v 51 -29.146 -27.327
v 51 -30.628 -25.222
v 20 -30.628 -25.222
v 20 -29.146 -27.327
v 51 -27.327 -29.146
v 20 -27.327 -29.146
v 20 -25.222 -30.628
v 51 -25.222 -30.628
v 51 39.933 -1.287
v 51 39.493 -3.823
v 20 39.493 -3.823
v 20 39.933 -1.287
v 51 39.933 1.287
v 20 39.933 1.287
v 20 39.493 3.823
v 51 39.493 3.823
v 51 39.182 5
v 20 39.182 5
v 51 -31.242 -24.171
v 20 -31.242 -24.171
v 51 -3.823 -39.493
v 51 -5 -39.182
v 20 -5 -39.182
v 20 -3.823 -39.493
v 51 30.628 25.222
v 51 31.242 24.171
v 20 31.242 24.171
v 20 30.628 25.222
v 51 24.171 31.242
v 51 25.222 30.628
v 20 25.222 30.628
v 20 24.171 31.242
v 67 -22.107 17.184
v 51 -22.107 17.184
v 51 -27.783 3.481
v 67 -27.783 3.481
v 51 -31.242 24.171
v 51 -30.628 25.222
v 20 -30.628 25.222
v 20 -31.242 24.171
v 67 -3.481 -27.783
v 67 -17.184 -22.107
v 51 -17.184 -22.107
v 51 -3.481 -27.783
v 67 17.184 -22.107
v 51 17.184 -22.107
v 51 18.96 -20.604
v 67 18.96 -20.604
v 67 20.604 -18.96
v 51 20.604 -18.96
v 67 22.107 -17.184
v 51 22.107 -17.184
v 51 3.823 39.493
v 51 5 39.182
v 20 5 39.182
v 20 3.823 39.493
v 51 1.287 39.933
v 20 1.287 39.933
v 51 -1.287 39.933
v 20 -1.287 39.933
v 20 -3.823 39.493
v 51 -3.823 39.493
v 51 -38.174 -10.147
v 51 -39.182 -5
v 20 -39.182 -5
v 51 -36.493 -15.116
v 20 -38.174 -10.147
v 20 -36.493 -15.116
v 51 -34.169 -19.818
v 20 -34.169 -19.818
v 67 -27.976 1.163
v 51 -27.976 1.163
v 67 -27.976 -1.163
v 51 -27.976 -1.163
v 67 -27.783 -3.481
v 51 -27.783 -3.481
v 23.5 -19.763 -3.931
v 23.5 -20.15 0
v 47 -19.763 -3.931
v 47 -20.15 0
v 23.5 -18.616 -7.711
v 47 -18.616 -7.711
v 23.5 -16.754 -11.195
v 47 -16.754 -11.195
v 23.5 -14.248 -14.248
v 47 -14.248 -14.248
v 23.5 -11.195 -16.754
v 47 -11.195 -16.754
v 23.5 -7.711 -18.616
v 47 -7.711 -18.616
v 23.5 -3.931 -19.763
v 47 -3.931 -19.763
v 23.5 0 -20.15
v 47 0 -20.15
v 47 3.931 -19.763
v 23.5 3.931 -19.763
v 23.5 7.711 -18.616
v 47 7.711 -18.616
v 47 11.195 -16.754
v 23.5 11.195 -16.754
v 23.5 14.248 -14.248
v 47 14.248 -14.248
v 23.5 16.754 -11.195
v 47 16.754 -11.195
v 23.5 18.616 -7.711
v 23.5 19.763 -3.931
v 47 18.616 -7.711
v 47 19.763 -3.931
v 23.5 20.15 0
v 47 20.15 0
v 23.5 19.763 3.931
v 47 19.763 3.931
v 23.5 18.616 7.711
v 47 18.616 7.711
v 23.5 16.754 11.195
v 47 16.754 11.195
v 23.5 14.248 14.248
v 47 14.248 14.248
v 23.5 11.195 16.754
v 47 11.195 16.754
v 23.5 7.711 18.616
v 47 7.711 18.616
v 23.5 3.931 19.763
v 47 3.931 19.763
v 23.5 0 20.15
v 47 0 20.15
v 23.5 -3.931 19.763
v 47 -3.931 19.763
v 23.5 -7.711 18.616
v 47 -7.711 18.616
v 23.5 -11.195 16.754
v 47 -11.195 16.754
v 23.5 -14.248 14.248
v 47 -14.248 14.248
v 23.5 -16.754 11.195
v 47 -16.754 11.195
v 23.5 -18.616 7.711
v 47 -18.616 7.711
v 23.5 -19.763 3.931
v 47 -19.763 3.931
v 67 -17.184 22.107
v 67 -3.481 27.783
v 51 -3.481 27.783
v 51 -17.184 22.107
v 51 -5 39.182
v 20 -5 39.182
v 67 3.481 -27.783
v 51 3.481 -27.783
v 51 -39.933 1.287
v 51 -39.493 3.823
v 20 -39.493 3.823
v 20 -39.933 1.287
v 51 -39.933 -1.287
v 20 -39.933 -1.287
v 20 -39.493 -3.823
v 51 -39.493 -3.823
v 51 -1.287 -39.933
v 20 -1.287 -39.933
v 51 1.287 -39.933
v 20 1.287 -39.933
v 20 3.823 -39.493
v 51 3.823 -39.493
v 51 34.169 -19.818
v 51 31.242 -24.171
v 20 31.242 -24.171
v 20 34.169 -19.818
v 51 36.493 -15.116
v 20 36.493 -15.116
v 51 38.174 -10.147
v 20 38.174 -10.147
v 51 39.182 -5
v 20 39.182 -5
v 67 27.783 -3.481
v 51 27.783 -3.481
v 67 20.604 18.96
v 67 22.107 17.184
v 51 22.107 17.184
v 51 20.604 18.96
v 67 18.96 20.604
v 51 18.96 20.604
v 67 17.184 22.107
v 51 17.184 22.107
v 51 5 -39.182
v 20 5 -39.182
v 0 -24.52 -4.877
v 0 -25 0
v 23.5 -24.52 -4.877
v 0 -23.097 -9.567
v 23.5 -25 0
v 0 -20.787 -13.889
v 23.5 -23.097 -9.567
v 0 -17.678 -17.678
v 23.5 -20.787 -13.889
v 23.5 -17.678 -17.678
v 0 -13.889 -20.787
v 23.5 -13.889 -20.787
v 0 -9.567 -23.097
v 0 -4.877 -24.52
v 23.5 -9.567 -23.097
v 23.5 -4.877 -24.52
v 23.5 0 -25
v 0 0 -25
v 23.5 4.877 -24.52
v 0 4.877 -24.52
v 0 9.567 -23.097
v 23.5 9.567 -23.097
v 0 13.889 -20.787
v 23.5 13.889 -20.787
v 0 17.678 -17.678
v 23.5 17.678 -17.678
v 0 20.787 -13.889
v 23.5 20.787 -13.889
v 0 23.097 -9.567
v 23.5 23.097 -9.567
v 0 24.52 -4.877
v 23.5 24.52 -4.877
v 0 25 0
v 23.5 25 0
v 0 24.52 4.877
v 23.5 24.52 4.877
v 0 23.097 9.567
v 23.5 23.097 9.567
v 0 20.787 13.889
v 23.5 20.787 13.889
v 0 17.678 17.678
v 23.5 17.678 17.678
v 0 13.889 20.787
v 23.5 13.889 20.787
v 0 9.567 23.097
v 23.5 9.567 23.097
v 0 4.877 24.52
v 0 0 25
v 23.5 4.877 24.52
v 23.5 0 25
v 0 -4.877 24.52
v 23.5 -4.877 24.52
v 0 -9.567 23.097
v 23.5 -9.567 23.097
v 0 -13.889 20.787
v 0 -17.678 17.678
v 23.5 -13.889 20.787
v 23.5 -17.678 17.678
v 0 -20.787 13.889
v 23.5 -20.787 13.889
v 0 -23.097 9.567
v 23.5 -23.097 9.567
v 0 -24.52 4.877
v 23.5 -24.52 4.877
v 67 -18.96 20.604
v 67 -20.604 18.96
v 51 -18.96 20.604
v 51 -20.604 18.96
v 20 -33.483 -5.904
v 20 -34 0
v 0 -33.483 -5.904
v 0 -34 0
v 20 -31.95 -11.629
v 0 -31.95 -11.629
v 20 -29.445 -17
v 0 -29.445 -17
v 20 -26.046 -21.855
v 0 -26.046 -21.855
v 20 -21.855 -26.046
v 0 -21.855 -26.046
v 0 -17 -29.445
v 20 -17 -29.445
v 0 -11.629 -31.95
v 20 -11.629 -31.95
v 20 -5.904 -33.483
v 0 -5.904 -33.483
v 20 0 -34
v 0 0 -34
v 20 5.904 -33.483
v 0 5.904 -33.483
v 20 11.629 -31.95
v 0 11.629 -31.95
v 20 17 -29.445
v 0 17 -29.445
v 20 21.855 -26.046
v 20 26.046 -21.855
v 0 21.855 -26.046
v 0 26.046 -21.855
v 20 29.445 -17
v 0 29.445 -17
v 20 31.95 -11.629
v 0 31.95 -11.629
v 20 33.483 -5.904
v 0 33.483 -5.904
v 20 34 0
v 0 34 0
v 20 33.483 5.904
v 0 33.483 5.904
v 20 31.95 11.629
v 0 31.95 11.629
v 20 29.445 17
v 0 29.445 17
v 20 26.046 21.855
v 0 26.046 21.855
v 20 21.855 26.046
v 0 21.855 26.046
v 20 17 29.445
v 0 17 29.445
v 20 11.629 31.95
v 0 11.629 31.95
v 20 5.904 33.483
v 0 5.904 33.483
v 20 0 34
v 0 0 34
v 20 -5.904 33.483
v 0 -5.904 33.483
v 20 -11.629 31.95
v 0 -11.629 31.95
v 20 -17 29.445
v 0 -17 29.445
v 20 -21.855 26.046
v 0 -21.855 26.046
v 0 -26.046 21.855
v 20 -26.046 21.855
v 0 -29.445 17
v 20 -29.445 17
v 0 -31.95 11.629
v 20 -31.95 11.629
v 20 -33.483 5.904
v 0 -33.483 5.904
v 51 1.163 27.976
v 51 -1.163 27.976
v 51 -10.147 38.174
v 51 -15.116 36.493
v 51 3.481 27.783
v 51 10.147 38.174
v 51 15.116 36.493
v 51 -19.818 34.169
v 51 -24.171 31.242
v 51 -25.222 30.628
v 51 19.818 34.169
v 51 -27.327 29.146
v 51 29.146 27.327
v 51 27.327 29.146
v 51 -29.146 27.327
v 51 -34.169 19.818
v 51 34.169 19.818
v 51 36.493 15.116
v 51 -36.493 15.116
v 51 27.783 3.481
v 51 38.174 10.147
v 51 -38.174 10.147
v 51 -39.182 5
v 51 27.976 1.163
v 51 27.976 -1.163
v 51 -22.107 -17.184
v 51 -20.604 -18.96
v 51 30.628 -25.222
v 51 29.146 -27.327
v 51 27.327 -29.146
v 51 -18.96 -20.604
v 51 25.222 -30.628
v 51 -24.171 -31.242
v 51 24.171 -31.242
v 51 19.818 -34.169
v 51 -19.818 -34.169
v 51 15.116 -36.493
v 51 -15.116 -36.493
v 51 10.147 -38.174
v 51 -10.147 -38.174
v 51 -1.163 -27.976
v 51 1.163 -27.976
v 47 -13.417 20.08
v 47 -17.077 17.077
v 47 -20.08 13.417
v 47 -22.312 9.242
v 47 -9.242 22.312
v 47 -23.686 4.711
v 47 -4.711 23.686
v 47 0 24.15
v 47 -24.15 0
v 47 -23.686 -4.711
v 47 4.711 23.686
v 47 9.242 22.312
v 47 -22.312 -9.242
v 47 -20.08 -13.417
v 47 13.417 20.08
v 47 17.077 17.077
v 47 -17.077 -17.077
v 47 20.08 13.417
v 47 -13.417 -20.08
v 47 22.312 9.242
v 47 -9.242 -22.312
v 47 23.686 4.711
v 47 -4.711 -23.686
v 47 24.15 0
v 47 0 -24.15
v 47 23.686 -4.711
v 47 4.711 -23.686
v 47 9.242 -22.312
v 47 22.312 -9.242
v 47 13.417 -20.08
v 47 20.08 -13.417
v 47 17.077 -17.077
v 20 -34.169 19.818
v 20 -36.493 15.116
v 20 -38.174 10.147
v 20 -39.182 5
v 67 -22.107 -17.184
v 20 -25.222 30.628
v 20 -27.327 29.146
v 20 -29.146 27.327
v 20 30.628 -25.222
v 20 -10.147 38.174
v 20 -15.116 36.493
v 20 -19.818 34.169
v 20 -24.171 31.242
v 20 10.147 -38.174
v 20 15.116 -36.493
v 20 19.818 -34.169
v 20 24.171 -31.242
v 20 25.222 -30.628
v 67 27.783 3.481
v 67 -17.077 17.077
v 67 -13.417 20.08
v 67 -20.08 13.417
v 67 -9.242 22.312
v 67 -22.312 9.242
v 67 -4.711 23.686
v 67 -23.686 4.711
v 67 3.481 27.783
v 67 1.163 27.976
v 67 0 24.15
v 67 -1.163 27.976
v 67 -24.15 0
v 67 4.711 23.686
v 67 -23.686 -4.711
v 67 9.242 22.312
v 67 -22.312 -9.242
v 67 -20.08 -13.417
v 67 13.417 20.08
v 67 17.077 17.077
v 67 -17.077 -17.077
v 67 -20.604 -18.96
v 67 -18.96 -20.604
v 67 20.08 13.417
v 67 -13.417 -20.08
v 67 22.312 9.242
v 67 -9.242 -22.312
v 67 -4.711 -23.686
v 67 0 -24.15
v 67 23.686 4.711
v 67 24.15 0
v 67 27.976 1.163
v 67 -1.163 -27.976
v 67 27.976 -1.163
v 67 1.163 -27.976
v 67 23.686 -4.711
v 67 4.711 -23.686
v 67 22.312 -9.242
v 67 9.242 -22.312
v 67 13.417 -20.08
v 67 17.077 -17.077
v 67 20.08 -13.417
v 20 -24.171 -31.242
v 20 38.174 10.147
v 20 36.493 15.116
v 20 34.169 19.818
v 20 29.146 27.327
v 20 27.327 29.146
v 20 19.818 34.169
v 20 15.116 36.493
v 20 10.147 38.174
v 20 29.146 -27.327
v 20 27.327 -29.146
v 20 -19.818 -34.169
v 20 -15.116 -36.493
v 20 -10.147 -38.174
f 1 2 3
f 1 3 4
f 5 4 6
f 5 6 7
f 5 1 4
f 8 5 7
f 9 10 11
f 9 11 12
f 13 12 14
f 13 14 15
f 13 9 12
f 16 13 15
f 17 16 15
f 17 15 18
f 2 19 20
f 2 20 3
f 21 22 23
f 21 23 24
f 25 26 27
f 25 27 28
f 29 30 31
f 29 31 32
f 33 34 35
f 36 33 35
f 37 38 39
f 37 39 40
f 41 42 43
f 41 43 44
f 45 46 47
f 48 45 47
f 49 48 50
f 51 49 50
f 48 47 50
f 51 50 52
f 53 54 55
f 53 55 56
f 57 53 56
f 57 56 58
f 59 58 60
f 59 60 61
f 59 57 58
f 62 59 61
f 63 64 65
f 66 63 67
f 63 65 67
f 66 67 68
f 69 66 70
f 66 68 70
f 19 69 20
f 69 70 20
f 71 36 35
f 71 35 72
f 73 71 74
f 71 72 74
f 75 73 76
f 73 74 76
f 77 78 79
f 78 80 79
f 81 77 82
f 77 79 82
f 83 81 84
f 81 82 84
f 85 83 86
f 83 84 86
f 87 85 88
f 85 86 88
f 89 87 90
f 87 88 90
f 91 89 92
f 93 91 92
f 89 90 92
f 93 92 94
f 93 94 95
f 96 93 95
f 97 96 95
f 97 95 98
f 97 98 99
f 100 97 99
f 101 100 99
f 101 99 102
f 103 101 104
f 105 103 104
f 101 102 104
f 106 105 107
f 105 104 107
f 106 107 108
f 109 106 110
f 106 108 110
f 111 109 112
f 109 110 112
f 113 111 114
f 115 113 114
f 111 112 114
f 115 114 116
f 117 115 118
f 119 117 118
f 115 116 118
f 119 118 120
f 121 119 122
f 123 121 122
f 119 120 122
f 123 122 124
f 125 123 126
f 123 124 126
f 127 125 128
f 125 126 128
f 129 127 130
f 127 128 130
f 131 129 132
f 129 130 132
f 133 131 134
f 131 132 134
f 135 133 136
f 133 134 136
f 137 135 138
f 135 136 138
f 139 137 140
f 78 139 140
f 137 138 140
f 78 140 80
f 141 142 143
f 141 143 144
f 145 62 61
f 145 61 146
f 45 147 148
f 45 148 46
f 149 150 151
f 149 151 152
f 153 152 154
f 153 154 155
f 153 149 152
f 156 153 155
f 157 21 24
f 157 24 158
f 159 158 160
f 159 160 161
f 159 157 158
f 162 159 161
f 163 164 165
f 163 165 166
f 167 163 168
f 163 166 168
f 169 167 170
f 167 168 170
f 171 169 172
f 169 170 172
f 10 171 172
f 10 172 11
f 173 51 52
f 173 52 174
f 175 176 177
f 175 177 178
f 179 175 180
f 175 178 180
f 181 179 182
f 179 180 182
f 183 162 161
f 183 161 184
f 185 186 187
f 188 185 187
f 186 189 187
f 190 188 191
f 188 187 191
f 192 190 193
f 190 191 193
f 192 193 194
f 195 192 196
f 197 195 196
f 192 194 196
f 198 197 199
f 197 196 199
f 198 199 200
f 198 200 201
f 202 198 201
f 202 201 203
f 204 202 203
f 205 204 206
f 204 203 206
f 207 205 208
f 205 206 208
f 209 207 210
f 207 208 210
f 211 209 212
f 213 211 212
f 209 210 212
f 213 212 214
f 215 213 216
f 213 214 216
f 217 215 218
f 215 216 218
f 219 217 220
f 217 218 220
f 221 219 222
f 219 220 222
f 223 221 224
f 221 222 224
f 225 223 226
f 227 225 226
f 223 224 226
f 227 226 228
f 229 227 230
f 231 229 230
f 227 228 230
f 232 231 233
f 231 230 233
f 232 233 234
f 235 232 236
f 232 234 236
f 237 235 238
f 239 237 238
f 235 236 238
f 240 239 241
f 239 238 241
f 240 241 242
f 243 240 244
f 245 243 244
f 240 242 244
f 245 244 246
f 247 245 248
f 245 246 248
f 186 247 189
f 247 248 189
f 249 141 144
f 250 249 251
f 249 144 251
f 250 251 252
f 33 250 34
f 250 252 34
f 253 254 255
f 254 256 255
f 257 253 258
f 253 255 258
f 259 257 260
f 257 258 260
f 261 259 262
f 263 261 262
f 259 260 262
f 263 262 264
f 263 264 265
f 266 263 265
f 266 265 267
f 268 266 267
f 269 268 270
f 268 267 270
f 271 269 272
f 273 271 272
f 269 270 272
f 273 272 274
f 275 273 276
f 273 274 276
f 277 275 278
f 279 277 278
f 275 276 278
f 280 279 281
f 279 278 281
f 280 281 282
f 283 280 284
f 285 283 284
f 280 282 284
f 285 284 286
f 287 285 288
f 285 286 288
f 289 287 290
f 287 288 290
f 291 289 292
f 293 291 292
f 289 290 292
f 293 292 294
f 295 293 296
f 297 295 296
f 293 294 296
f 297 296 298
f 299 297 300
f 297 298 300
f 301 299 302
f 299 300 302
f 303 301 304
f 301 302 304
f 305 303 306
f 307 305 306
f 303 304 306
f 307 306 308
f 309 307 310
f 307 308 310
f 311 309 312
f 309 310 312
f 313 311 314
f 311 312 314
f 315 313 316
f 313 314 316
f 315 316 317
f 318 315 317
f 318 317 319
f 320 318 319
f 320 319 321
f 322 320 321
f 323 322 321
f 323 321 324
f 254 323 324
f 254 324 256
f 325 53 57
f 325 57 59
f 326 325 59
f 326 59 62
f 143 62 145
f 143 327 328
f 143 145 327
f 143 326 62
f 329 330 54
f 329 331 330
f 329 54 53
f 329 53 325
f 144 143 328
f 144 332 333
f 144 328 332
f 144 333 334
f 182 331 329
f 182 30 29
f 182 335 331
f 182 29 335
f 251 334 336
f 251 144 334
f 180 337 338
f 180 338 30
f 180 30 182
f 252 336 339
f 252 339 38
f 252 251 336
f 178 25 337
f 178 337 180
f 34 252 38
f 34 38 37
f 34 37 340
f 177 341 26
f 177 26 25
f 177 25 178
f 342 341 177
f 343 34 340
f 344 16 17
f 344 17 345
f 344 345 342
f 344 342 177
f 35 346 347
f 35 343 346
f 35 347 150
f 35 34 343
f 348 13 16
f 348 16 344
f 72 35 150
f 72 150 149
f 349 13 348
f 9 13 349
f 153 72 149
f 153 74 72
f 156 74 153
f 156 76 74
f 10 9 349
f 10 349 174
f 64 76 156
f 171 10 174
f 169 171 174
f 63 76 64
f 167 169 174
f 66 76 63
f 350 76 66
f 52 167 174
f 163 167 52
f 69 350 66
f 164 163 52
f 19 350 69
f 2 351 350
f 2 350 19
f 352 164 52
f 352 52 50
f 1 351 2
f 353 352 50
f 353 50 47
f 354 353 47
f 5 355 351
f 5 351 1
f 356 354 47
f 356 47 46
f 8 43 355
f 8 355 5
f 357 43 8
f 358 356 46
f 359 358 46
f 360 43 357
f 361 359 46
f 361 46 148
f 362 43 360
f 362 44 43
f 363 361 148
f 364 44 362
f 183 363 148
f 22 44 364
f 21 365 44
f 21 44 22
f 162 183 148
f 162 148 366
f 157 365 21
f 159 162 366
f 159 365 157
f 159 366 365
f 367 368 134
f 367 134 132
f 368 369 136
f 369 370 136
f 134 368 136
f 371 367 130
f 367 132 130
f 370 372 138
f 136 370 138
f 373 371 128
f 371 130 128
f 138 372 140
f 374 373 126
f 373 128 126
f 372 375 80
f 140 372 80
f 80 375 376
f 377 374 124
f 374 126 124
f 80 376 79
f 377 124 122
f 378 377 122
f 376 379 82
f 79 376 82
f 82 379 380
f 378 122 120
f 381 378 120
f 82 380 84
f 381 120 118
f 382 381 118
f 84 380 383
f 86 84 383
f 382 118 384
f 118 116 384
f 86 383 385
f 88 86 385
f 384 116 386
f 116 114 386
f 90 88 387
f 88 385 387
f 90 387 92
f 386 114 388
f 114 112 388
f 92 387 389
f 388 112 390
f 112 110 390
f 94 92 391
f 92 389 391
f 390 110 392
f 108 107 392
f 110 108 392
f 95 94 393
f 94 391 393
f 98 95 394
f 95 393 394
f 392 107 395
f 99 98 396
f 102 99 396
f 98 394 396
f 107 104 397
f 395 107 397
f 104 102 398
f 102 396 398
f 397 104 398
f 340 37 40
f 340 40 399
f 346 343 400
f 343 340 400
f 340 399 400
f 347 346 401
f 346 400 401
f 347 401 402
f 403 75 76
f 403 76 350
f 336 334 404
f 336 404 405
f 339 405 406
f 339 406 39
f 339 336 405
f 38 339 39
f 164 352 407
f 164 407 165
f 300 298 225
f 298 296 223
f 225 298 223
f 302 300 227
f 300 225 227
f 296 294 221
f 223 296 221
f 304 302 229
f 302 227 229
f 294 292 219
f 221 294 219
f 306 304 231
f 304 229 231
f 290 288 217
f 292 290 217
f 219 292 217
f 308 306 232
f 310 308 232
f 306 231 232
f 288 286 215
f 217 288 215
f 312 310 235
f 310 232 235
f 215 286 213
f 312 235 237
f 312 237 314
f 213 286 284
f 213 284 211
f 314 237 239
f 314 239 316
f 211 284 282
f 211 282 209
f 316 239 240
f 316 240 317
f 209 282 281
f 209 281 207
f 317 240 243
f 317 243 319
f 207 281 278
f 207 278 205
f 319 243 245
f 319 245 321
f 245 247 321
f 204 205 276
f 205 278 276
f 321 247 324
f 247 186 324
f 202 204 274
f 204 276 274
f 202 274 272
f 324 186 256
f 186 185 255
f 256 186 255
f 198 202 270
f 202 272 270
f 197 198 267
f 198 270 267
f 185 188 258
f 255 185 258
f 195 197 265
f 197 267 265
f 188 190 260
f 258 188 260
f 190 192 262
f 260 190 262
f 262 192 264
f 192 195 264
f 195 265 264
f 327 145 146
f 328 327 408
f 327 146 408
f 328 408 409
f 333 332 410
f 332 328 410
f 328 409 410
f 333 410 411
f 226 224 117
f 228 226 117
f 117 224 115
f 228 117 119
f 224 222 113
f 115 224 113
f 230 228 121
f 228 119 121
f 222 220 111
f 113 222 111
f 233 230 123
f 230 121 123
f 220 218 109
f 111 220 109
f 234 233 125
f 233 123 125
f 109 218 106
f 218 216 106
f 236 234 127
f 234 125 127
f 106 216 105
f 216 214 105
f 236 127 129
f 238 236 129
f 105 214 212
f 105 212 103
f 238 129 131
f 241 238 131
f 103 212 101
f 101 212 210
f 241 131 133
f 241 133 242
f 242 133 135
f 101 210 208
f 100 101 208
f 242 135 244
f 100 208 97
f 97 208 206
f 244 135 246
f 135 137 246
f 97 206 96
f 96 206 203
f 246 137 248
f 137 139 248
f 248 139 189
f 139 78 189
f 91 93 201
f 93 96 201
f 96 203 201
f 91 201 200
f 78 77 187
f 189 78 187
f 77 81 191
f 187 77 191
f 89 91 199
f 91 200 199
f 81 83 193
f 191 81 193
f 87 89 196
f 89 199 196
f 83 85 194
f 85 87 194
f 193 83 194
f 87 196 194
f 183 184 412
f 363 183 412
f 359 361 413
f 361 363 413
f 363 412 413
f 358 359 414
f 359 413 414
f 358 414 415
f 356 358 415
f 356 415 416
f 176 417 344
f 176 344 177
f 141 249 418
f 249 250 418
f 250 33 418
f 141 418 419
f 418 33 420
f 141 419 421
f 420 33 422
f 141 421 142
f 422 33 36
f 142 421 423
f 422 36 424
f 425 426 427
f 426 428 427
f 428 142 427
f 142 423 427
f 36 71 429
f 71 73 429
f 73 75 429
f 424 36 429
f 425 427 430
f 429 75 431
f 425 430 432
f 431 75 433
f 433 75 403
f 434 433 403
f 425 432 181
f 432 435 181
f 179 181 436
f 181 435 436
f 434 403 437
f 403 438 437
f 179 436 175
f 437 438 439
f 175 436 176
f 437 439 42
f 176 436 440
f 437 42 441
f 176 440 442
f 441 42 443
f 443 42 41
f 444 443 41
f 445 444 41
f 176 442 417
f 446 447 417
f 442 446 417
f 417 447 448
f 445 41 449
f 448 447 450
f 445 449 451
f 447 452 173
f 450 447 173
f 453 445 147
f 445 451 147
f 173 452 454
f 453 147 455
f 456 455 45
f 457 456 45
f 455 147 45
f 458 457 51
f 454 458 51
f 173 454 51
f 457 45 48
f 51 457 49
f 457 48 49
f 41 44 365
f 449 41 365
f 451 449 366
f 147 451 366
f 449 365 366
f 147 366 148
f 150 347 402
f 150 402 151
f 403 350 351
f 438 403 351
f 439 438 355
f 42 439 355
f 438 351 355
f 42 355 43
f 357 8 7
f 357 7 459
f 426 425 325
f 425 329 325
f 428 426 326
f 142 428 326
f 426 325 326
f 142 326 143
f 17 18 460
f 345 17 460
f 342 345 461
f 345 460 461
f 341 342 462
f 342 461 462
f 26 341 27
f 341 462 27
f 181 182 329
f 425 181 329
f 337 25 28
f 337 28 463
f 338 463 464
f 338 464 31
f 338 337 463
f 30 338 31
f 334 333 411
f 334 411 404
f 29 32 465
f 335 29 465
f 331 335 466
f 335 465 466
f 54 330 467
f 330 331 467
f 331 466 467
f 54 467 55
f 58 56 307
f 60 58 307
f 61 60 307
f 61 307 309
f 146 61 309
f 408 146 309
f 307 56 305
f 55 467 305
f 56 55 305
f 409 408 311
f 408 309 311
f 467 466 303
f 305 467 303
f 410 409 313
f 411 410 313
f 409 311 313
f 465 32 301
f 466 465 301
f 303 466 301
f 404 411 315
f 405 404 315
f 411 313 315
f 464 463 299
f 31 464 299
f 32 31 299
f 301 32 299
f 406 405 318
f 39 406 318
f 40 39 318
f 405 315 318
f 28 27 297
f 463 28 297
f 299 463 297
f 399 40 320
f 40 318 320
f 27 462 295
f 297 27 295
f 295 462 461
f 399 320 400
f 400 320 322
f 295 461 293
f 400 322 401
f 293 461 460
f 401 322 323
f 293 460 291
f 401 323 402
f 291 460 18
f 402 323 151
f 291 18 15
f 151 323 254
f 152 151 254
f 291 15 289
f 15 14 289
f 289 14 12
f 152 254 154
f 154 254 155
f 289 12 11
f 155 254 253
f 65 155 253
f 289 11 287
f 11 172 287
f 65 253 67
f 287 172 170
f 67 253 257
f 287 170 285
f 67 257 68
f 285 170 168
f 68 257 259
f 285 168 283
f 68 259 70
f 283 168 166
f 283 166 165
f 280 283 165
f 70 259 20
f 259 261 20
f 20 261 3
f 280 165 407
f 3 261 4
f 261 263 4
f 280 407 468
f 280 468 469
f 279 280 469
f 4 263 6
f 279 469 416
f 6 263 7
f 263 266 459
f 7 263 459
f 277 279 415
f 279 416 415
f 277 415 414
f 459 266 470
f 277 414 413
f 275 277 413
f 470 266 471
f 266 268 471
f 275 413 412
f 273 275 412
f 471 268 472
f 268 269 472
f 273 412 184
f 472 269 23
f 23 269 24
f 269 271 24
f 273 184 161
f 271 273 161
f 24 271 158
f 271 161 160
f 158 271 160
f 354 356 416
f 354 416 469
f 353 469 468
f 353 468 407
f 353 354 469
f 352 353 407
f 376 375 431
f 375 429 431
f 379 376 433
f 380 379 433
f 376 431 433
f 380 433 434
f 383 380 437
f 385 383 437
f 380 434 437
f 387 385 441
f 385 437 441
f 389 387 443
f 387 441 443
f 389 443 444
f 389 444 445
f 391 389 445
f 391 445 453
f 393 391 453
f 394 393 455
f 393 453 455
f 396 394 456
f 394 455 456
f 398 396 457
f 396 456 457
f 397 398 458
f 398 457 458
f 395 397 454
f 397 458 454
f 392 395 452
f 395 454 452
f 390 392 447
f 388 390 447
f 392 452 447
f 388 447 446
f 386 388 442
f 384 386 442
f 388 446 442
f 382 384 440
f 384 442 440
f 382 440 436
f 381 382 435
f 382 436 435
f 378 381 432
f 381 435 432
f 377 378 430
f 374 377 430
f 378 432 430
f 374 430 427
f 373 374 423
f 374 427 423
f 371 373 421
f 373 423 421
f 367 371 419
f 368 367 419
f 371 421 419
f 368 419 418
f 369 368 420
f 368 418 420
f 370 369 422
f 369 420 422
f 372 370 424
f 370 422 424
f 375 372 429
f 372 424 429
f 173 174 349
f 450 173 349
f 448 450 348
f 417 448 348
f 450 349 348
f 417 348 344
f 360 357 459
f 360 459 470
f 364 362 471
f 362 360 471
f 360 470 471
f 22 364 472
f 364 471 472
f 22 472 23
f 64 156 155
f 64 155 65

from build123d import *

# Parameters (mm, degrees)
SKETCH3_R           = 45.8838883
CUT_EXTRUDE1_DEPTH  = 16
BOSS_EXTRUDE1_DEPTH = 31
CIRPATTERN1_COUNT   = 8


with BuildPart() as part:
    # Sketch1 → Revolve1 (revolve)
    with BuildSketch(Plane.XY):
        Polygon((0, -25), (23.5, -25), (23.5, -20.15), (47, -20.15), (47, -24.15), (67, -24.15), (67, -28), (51, -28), (51, -39.5), (20, -39.5), (20, -34), (0, -34), align=None)
    revolve(axis=Axis((0, 0, 0), (1, 0, 0)))

    # Sketch3 → Cut-Extrude1 (cut)
    with BuildSketch(Plane(origin=(67, 0, 0), x_dir=(0, 0, -1), z_dir=(1, 0, 0))):
        Circle(SKETCH3_R)
        Polygon((0, 29.224589408), (-20.664905348, 20.664905348), (-29.224589408, 0), (-20.664905348, -20.664905348), (0, -29.224589408), (20.664905348, -20.664905348), (29.224589408, 0), (20.664905348, 20.664905348), align=None, mode=Mode.SUBTRACT)
    extrude(amount=-CUT_EXTRUDE1_DEPTH, mode=Mode.SUBTRACT)

    # Sketch4 → Boss-Extrude1 (add)
    with BuildSketch(Plane(origin=(51, 0, 0), x_dir=(0, 0, -1), z_dir=(1, 0, 0))):
        with BuildLine():
            Line((-3.822673778, 39.492546862), (-5, 39.182266397))
            Line((-5, 39.182266397), (5, 39.182266397))
            Line((5, 39.182266397), (3.822673778, 39.492546862))
            ThreePointArc((3.822673778, 39.492546862), (0, 39.987817799), (-3.822673778, 39.492546862))
        make_face()
    boss_extrude1 = extrude(amount=-BOSS_EXTRUDE1_DEPTH)

    # CirPattern1: Boss-Extrude1 ×8 about axis
    cirpattern1_axis = Axis((0, 0, 0), (1, 0, 0))
    for i in range(1, CIRPATTERN1_COUNT):
        add(boss_extrude1.rotate(cirpattern1_axis, i * 360 / CIRPATTERN1_COUNT))


solid = part.part
